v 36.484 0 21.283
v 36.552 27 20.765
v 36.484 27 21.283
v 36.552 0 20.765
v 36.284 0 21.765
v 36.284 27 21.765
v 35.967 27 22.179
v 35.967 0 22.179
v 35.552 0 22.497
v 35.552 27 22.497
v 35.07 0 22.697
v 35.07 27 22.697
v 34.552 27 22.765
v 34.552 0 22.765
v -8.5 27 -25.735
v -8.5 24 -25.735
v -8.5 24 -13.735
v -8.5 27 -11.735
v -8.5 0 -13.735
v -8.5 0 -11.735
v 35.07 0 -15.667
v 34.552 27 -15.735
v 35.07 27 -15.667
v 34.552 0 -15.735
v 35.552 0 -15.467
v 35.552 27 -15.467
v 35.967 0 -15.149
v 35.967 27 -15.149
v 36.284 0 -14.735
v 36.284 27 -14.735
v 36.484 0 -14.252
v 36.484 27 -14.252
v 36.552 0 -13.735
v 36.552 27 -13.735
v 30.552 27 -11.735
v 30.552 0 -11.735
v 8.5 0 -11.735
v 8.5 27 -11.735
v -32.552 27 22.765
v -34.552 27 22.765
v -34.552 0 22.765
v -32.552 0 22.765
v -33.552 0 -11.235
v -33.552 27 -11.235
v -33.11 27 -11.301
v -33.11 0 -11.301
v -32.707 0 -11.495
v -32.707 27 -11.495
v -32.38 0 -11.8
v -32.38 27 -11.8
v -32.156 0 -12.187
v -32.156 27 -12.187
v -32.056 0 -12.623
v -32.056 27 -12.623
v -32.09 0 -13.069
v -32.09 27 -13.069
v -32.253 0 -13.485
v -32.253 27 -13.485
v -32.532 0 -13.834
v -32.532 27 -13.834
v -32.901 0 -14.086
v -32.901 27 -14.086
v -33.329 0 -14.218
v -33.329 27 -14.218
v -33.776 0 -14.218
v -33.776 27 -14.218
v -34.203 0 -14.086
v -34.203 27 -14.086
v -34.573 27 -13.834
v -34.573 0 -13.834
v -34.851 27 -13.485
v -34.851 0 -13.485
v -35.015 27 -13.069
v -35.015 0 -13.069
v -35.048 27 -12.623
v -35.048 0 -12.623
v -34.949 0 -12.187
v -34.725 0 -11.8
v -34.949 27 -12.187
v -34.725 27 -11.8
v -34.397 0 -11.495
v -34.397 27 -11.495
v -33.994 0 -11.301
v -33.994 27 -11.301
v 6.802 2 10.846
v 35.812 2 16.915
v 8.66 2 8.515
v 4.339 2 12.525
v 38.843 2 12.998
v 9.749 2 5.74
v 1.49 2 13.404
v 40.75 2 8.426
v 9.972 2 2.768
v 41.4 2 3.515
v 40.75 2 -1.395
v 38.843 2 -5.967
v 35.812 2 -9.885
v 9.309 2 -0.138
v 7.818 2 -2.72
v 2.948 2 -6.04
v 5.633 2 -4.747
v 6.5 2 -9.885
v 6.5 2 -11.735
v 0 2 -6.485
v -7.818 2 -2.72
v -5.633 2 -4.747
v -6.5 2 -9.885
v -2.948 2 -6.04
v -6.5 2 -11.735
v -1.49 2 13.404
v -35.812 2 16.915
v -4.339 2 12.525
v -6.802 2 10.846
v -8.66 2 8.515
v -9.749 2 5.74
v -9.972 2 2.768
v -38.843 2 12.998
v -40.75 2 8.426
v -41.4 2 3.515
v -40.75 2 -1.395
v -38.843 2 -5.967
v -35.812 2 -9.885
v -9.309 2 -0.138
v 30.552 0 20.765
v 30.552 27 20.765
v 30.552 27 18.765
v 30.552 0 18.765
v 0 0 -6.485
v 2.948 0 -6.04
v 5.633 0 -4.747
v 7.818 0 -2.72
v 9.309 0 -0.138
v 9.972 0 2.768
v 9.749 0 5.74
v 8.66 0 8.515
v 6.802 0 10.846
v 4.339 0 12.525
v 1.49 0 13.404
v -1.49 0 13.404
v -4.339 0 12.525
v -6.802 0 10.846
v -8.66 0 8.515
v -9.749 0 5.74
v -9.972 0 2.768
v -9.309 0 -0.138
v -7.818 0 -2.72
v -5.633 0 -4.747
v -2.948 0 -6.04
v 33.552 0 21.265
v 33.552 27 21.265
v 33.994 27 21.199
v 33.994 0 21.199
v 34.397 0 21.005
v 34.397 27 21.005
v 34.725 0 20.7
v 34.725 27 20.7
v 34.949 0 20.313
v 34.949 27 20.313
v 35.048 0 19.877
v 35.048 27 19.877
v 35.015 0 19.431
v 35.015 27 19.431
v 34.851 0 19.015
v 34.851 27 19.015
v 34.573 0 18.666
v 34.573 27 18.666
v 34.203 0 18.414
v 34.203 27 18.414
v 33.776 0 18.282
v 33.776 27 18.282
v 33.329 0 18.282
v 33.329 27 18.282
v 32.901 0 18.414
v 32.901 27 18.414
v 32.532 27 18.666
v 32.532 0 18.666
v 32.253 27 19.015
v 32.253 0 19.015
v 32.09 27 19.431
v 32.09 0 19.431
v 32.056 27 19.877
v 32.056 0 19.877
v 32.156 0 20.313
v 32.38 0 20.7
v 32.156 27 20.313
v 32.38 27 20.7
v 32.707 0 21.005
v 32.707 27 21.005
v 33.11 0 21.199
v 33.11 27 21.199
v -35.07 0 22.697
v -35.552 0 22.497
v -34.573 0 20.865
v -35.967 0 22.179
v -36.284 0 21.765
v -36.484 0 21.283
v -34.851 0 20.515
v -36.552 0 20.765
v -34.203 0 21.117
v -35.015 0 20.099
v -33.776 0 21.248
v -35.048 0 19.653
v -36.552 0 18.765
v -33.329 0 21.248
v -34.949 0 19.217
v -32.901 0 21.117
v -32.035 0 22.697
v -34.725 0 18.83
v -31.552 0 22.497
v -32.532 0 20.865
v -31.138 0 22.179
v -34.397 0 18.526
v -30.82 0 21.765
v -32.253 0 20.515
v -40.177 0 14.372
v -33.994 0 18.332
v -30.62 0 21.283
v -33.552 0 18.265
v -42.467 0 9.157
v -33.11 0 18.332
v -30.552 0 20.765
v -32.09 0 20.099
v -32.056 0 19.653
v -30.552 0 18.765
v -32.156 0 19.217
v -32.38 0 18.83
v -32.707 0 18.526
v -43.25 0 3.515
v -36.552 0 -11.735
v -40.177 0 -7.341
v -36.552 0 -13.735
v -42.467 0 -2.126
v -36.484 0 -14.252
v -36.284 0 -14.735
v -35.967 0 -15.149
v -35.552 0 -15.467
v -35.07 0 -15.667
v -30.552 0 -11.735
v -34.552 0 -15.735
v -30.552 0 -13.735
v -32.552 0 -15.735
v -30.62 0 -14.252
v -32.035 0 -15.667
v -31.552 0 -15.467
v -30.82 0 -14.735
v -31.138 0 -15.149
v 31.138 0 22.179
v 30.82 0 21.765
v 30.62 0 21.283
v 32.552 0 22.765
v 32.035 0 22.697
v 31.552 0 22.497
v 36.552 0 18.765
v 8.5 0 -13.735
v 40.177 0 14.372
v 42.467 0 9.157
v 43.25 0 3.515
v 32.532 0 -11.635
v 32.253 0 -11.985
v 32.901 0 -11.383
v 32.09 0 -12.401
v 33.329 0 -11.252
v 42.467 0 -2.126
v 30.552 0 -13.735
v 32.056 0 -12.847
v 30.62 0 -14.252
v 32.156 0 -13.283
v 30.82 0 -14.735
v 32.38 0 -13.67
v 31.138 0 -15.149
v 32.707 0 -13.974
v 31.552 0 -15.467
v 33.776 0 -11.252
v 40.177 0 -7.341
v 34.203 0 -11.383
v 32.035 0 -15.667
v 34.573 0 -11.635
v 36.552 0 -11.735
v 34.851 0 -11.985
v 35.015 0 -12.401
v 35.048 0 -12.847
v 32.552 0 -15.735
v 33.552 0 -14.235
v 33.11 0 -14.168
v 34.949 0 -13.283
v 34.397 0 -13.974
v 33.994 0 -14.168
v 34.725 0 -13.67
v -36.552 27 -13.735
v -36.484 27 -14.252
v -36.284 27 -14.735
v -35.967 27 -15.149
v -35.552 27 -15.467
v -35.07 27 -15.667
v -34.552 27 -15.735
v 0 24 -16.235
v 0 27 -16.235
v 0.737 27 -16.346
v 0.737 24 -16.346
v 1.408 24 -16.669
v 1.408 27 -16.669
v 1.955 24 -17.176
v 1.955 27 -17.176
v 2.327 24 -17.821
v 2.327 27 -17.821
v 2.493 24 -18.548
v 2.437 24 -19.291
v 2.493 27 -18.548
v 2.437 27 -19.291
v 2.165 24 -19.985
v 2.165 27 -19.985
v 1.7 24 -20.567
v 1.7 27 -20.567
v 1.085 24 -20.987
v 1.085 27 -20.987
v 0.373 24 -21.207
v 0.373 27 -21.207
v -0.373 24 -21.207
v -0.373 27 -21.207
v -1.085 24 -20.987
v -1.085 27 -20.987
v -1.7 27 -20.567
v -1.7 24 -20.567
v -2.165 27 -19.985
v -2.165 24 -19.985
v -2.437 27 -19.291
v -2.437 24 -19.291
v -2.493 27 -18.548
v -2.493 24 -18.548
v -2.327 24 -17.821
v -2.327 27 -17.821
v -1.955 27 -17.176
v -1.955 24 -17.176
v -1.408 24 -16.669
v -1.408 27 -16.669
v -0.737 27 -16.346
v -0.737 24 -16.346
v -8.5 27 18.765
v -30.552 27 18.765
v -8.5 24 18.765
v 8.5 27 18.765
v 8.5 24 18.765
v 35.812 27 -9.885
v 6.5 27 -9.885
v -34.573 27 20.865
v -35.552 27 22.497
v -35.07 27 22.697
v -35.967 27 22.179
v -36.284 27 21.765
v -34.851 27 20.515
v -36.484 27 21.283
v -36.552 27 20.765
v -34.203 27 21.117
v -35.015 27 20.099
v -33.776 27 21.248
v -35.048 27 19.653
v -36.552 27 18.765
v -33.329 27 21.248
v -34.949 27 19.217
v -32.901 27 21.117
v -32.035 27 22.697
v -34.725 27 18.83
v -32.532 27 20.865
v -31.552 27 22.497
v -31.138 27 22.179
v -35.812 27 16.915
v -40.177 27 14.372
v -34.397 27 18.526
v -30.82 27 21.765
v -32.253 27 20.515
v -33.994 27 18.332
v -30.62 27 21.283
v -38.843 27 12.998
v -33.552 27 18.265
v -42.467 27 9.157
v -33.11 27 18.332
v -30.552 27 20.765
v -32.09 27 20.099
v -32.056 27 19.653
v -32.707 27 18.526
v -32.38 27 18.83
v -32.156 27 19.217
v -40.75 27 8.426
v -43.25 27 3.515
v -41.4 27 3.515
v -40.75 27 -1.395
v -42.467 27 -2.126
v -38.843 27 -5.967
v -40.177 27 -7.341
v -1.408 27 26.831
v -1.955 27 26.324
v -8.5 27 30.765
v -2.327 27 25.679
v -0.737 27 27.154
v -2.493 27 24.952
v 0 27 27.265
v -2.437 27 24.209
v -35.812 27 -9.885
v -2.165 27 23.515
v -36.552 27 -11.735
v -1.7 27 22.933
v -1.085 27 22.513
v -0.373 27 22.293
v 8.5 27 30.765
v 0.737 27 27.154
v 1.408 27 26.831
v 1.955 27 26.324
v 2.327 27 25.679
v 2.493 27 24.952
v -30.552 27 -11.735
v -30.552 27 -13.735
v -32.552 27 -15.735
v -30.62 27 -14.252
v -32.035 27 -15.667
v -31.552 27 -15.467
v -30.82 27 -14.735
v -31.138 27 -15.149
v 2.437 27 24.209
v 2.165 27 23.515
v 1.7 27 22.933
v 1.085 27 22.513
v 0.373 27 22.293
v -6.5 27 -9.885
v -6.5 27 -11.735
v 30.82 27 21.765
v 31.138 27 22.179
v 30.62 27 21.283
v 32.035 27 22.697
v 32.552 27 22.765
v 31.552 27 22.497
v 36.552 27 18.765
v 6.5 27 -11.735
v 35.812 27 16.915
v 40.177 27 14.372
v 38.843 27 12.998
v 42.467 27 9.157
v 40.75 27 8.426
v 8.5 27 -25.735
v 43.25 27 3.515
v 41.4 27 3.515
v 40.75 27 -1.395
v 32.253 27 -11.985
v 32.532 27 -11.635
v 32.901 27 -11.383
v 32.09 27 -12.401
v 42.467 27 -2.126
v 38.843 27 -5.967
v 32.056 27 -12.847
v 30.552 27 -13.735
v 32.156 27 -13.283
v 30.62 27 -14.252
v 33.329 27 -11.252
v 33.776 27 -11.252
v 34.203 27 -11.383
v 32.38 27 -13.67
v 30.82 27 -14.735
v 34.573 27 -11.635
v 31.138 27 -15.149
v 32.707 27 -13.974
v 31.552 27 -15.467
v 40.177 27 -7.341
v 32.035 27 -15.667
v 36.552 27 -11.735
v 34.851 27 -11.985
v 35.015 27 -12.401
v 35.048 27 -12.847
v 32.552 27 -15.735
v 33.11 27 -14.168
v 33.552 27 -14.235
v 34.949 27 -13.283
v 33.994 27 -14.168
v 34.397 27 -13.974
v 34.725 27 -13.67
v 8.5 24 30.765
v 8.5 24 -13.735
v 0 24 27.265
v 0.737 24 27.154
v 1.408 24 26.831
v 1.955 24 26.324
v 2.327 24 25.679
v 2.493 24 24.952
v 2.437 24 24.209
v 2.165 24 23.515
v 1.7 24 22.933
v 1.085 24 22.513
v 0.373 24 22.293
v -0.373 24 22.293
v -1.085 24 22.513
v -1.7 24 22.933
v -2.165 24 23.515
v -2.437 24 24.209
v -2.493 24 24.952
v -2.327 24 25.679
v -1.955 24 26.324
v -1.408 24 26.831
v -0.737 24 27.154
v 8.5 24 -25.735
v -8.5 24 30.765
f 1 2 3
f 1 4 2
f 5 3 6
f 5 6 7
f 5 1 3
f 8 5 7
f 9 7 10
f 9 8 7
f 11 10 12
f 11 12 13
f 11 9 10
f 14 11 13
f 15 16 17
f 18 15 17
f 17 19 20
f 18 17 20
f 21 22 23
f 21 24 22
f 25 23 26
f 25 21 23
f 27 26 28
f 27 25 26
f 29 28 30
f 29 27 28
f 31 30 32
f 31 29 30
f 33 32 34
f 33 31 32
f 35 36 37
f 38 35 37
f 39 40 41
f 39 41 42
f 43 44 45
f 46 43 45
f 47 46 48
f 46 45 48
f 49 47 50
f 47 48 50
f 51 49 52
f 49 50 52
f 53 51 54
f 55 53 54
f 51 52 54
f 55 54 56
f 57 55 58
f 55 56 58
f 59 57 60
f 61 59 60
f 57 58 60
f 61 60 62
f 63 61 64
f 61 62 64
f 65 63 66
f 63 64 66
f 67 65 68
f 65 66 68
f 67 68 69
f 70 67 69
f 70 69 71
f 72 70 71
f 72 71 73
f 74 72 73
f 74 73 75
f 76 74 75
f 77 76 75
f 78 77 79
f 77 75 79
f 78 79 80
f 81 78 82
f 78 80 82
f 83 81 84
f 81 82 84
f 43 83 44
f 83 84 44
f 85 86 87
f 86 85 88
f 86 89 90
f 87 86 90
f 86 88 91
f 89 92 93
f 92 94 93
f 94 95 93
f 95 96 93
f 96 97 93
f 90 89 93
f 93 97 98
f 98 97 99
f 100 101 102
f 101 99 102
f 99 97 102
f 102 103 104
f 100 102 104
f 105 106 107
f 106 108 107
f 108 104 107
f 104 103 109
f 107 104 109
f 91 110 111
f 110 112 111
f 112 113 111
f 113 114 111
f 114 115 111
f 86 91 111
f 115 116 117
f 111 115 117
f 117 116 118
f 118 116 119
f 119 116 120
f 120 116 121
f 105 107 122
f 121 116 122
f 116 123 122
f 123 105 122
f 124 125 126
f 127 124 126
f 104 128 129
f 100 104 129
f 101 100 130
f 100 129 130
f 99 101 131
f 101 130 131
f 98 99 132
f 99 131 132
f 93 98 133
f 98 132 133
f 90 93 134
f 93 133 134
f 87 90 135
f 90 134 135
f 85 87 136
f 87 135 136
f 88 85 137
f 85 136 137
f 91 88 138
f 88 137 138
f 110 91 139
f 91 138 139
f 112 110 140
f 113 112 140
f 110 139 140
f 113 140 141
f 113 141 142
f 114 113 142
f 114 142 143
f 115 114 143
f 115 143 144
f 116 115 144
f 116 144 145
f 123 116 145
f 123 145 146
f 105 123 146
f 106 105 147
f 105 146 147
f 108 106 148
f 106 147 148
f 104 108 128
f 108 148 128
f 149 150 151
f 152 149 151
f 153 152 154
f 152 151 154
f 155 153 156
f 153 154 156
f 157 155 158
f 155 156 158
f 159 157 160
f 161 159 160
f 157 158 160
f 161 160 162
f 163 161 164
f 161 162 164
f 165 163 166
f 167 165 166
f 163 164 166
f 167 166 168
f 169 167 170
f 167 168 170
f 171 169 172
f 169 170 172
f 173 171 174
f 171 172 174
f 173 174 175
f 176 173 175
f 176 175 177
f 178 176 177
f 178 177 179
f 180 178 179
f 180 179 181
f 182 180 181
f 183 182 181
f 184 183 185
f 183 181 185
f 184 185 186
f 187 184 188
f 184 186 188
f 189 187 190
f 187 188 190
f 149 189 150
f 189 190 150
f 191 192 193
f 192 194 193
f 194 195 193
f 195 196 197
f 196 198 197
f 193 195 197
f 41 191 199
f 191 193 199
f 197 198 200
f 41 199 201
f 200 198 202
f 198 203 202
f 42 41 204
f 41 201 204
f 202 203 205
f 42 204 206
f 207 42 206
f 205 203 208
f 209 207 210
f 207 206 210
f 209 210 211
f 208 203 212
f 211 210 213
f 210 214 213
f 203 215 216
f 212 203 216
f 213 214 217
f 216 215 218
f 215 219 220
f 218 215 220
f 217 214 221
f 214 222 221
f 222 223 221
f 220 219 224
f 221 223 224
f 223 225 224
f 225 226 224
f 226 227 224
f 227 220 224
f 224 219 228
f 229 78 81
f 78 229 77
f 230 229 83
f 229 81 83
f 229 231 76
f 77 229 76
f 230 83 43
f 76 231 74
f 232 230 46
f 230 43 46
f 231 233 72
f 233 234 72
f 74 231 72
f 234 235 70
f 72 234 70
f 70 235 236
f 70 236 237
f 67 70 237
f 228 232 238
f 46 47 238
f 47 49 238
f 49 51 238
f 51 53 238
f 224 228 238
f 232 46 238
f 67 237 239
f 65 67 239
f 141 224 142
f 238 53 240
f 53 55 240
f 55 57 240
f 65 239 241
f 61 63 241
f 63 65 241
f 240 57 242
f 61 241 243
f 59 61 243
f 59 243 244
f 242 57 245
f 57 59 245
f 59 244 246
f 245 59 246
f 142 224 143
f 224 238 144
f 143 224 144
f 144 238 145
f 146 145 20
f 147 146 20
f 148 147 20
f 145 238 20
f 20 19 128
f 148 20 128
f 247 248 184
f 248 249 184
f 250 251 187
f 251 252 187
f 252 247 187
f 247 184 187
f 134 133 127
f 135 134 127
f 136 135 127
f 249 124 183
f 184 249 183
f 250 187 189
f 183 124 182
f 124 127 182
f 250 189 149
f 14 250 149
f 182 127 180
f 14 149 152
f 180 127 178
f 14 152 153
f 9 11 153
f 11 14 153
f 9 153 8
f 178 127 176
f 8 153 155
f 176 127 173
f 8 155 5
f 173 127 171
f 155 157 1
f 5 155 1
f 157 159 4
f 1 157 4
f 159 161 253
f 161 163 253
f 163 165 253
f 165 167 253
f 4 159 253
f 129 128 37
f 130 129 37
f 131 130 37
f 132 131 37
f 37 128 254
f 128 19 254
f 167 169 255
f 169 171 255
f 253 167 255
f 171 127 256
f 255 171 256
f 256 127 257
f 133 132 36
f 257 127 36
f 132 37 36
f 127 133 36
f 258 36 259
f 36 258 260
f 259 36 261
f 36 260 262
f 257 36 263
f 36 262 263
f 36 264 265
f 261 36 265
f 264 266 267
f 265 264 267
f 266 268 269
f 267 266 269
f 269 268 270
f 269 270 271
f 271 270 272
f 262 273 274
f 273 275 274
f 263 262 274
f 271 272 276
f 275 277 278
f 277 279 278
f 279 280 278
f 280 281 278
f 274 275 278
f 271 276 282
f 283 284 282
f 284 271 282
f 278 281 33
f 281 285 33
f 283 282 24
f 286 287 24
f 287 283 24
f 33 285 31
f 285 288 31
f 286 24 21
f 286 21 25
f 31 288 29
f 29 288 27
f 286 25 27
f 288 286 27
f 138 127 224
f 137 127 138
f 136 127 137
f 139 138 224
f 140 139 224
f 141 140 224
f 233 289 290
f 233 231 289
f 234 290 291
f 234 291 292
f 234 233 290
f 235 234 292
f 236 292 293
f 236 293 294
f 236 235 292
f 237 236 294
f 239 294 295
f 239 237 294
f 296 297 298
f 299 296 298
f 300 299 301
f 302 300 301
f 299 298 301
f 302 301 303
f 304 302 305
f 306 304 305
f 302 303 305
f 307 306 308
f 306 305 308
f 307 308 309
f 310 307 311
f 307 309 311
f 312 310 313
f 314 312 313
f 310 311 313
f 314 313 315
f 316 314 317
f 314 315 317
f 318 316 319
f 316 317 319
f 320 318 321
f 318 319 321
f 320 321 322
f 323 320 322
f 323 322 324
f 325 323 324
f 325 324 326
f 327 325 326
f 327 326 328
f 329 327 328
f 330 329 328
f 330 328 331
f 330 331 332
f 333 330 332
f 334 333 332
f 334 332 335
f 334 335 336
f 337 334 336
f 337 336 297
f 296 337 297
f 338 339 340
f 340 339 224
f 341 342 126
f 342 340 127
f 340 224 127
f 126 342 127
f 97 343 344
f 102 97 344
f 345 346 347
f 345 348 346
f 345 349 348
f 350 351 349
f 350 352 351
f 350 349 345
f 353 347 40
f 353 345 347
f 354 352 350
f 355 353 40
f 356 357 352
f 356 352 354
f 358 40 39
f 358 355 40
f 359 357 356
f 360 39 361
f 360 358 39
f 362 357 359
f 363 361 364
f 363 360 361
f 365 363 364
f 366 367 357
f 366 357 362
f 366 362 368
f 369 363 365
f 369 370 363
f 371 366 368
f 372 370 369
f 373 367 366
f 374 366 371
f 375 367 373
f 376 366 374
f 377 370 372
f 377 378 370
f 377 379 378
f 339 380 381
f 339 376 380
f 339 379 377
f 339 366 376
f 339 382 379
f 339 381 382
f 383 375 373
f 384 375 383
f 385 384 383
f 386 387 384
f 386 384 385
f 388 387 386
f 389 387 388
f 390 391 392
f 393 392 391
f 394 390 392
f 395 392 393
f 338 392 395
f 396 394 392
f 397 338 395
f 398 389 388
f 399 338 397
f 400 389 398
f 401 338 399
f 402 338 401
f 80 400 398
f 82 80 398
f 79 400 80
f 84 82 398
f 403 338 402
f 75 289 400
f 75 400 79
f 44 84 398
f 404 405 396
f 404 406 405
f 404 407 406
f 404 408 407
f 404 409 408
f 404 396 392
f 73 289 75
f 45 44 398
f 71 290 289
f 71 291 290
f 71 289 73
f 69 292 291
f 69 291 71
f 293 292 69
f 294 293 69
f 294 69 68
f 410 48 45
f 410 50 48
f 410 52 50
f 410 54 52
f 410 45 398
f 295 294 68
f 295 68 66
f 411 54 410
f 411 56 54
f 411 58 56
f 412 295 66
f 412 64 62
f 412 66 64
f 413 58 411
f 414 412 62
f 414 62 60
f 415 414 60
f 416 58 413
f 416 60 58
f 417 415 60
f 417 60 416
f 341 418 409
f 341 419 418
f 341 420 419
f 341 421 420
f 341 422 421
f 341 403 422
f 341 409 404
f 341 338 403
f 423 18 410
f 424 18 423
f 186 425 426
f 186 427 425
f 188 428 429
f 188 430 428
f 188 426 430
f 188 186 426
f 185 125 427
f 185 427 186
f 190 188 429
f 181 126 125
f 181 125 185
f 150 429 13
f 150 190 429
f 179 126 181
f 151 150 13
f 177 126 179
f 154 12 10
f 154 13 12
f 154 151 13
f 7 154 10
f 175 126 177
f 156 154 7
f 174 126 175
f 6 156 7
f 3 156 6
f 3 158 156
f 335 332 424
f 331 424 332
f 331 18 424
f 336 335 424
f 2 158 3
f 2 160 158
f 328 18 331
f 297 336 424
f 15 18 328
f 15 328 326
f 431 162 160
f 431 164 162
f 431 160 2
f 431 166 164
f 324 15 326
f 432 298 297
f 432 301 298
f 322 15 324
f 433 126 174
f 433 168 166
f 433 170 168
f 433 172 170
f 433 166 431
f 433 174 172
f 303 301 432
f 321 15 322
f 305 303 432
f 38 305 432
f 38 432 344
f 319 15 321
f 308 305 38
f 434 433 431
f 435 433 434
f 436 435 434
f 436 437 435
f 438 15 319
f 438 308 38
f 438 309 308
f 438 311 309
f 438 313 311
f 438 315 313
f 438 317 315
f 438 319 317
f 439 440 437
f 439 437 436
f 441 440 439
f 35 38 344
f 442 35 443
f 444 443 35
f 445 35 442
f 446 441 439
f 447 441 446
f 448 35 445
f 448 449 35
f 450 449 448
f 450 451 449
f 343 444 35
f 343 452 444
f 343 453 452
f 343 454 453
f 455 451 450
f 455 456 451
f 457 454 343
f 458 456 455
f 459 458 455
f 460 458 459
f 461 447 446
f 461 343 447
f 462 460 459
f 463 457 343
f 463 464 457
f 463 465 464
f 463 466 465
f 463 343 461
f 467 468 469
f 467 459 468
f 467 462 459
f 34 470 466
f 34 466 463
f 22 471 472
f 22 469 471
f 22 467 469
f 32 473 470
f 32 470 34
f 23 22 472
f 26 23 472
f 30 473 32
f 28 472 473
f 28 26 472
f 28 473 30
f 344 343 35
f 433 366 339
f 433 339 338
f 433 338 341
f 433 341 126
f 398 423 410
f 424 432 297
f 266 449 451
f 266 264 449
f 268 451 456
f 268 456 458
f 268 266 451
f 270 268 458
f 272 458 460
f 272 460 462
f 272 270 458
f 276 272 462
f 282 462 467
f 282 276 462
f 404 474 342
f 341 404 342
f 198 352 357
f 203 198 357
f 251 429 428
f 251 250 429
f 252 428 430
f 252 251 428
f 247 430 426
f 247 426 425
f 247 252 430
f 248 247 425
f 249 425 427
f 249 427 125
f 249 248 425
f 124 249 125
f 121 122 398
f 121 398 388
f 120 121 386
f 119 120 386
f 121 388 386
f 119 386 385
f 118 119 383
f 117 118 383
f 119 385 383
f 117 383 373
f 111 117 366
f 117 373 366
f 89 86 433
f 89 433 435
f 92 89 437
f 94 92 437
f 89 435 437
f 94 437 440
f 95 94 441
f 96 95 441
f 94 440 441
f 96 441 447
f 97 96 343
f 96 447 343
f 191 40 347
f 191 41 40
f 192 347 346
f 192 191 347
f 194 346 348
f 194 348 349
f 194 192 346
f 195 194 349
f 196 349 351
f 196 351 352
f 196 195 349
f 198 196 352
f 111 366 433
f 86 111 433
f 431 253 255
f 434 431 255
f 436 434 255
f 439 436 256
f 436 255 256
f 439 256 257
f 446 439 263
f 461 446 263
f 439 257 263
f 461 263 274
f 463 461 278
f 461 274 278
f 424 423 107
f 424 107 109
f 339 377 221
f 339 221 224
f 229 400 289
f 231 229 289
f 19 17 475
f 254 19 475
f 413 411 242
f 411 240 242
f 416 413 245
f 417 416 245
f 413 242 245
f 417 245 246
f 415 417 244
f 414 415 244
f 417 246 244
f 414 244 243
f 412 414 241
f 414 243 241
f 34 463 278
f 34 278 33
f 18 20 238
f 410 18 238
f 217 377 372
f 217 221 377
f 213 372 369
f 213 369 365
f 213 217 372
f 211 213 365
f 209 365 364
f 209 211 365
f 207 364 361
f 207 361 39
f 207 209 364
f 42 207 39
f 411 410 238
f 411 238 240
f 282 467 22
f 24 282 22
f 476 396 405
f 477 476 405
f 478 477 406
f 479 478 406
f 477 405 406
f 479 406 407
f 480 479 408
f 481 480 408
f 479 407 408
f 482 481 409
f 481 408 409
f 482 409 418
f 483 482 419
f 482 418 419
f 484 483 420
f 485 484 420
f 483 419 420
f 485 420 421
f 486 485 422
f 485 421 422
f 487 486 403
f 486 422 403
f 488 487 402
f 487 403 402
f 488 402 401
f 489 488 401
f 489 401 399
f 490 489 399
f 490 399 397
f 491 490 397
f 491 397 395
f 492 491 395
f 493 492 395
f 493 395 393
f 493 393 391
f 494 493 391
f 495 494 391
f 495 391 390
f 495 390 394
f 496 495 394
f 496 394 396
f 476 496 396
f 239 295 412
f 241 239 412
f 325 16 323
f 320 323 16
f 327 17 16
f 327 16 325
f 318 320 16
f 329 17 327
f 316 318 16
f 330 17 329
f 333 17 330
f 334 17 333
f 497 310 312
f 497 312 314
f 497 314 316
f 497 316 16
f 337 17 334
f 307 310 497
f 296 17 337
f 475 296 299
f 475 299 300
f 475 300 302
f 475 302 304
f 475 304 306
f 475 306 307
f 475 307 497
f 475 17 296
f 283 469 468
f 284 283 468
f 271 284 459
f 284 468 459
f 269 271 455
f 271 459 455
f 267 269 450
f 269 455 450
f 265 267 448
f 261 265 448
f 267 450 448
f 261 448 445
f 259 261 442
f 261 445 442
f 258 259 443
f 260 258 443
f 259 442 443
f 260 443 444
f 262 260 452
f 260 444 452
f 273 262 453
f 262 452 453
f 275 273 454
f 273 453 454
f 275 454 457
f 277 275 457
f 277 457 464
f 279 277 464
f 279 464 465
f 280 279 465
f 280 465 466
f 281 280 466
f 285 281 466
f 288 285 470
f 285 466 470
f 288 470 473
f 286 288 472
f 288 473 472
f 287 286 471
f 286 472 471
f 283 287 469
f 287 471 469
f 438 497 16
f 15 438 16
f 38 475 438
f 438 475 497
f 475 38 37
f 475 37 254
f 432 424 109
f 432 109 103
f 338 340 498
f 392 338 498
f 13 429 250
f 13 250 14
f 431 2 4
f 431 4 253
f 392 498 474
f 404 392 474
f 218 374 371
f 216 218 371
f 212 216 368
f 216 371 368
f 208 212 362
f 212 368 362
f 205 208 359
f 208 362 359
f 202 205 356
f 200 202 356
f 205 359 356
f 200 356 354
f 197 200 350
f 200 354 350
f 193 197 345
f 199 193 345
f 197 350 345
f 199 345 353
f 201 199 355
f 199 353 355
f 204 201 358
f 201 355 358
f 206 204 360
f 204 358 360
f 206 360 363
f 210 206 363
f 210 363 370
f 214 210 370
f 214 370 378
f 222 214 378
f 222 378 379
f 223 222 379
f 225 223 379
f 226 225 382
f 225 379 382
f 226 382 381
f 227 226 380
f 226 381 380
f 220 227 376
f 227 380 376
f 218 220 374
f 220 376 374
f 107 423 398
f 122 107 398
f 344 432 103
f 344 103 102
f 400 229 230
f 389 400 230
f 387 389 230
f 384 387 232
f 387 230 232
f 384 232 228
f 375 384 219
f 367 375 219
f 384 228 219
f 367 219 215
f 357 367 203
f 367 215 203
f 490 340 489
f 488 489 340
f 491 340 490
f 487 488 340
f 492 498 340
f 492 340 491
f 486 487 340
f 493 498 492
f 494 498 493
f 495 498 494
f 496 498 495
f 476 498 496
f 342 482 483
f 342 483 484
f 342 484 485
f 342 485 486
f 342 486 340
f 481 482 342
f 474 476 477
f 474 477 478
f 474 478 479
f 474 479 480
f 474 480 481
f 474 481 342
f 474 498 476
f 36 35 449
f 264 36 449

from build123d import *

# Parameters (mm, degrees)
BOSS_EXTRUDE2_DEPTH = 27
CUT_EXTRUDE3_DEPTH  = 25
SKETCH5_R           = 10
CUT_EXTRUDE4_DEPTH  = 2
SKETCH6_W           = 6
SKETCH6_H           = 4
BOSS_EXTRUDE3_DEPTH = 27
SKETCH7_R           = 1.5
CUT_EXTRUDE5_DEPTH  = 27
SKETCH15_W          = 17
SKETCH15_H          = 12
CUT_EXTRUDE6_DEPTH  = 24
FILLET1_R           = 2
CUT_EXTRUDE10_DEPTH = 25
SKETCH21_R          = 2.5
CUT_EXTRUDE11_DEPTH = 10


with BuildPart() as part:
    # Sketch1 → Boss-Extrude2 (new body)
    with BuildSketch(Plane(origin=(0, 0, 0), x_dir=(1, 0, 0), z_dir=(0, 1, 0))):
        with BuildLine():
            Line((8.5, 11.734748557), (8.5, 25.734748557))
            Line((8.5, 25.734748557), (-8.5, 25.734748557))
            Line((-8.5, 25.734748557), (-8.5, 11.734748557))
            Line((-8.5, 11.734748557), (-36.552303323, 11.734748557))
            ThreePointArc((-36.552303323, 11.734748557), (-43.25, -3.515251443), (-36.552303323, -18.765251443))
            Line((-36.552303323, -18.765251443), (-8.5, -18.765251443))
            Line((-8.5, -18.765251443), (-8.5, -30.765251443))
            Line((-8.5, -30.765251443), (8.5, -30.765251443))
            Line((8.5, -30.765251443), (8.5, -18.765251443))
            Line((8.5, -18.765251443), (36.552303323, -18.765251443))
            ThreePointArc((36.552303323, -18.765251443), (43.25, -3.515251443), (36.552303323, 11.734748557))
            Line((36.552303323, 11.734748557), (8.5, 11.734748557))
        make_face()
    extrude(amount=BOSS_EXTRUDE2_DEPTH)

    # Sketch4 → Cut-Extrude3 (cut)
    with BuildSketch(Plane(origin=(0, 27, 0), x_dir=(1, 0, 0), z_dir=(0, 1, 0))):
        with BuildLine():
            Line((6.5, 9.734748557), (35.75, 9.734748557))
            ThreePointArc((35.75, 9.734748557), (41.25, -3.515251443), (35.75, -16.765251443))
            Line((35.75, -16.765251443), (-35.75, -16.765251443))
            ThreePointArc((-35.75, -16.765251443), (-41.25, -3.515251443), (-35.75, 9.734748557))
            Line((-35.75, 9.734748557), (-6.5, 9.734748557))
            Line((-6.5, 9.734748557), (-6.5, 11.734748557))
            Line((-6.5, 11.734748557), (6.5, 11.734748557))
            Line((6.5, 11.734748557), (6.5, 9.734748557))
        make_face()
    extrude(amount=-CUT_EXTRUDE3_DEPTH, mode=Mode.SUBTRACT)

    # Sketch5 → Cut-Extrude4 (cut)
    with BuildSketch(Plane.XZ):
        with Locations(Location((0, 3.515251443, 0), (0, 0, 270))):
            Circle(SKETCH5_R)
    extrude(amount=-CUT_EXTRUDE4_DEPTH, mode=Mode.SUBTRACT)

    # Sketch6 → Boss-Extrude3 (add)
    with BuildSketch(Plane(origin=(0, 27, 0), x_dir=(1, 0, 0), z_dir=(0, 1, 0))):
        with Locations((-33.552303323, 13.734748557)):
            Rectangle(SKETCH6_W, SKETCH6_H)
        with Locations((-33.552303323, -20.765251443)):
            Rectangle(SKETCH6_W, SKETCH6_H)
        with Locations((33.552303323, -20.765251443)):
            Rectangle(SKETCH6_W, SKETCH6_H)
        with Locations((33.552303323, 13.734748557)):
            Rectangle(SKETCH6_W, SKETCH6_H)
    extrude(amount=-BOSS_EXTRUDE3_DEPTH)

    # Sketch7 → Cut-Extrude5 (cut)
    with BuildSketch(Plane(origin=(0, 27, 0), x_dir=(1, 0, 0), z_dir=(0, 1, 0))):
        with Locations(Location((-33.552303323, 12.734748557, 0), (0, 0, 270))):
            Circle(SKETCH7_R)
        with Locations(Location((-33.552303323, -19.765251443, 0), (0, 0, 90))):
            Circle(SKETCH7_R)
        with Locations(Location((33.552303323, -19.765251443, 0), (0, 0, 270))):
            Circle(SKETCH7_R)
        with Locations(Location((33.552303323, 12.734748557, 0), (0, 0, 90))):
            Circle(SKETCH7_R)
    extrude(amount=-CUT_EXTRUDE5_DEPTH, mode=Mode.SUBTRACT)

    # Sketch15 → Cut-Extrude6 (cut)
    with BuildSketch(Plane.XZ):
        with Locations((0, -19.734748557)):
            Rectangle(SKETCH15_W, SKETCH15_H)
        with Locations((0, 24.765251443)):
            Rectangle(SKETCH15_W, SKETCH15_H)
    extrude(amount=-CUT_EXTRUDE6_DEPTH, mode=Mode.SUBTRACT)

    # Fillet1
    fillet1_edges = [part.edges().sort_by_distance(p)[0] for p in [
        (36.552303323, 13.5, -15.734748557),
        (30.552303323, 13.5, -15.734748557),
        (-30.552303323, 13.5, -15.734748557),
        (-36.552303323, 13.5, -15.734748557),
        (-36.552303323, 13.5, 22.765251443),
        (-30.552303323, 13.5, 22.765251443),
        (30.552303323, 13.5, 22.765251443),
        (36.552303323, 13.5, 22.765251443),
    ]]
    fillet(fillet1_edges, radius=FILLET1_R)

    # Sketch20 → Cut-Extrude10 (cut)
    with BuildSketch(Plane(origin=(0, 27, 0), x_dir=(1, 0, 0), z_dir=(0, 1, 0))):
        with BuildLine():
            Line((6.5, 9.884748557), (-6.5, 9.884748557))
            Line((-6.5, 9.884748557), (-35.811855186, 9.884748557))
            ThreePointArc((-35.811855186, 9.884748557), (-41.4, -3.515251443), (-35.811855186, -16.915251443))
            Line((-35.811855186, -16.915251443), (35.811855186, -16.915251443))
            ThreePointArc((35.811855186, -16.915251443), (41.4, -3.515251443), (35.811855186, 9.884748557))
            Line((35.811855186, 9.884748557), (6.5, 9.884748557))
        make_face()
        with BuildLine():
            Line((35.75, 9.734748557), (6.5, 9.734748557))
            Line((6.5, 9.734748557), (-6.5, 9.734748557))
            Line((-6.5, 9.734748557), (-35.75, 9.734748557))
            ThreePointArc((-35.75, 9.734748557), (-41.25, -3.515251443), (-35.75, -16.765251443))
            Line((-35.75, -16.765251443), (35.75, -16.765251443))
            ThreePointArc((35.75, -16.765251443), (41.25, -3.515251443), (35.75, 9.734748557))
        make_face(mode=Mode.SUBTRACT)
    extrude(amount=-CUT_EXTRUDE10_DEPTH, mode=Mode.SUBTRACT)

    # Sketch21 → Cut-Extrude11 (cut)
    with BuildSketch(Plane(origin=(0, 27, 0), x_dir=(1, 0, 0), z_dir=(0, 1, 0))):
        with Locations(Location((0, 18.734748557, 0), (0, 0, 270))):
            Circle(SKETCH21_R)
        with Locations(Location((0, -24.765251443, 0), (0, 0, 270))):
            Circle(SKETCH21_R)
    extrude(amount=-CUT_EXTRUDE11_DEPTH, mode=Mode.SUBTRACT)


solid = part.part
